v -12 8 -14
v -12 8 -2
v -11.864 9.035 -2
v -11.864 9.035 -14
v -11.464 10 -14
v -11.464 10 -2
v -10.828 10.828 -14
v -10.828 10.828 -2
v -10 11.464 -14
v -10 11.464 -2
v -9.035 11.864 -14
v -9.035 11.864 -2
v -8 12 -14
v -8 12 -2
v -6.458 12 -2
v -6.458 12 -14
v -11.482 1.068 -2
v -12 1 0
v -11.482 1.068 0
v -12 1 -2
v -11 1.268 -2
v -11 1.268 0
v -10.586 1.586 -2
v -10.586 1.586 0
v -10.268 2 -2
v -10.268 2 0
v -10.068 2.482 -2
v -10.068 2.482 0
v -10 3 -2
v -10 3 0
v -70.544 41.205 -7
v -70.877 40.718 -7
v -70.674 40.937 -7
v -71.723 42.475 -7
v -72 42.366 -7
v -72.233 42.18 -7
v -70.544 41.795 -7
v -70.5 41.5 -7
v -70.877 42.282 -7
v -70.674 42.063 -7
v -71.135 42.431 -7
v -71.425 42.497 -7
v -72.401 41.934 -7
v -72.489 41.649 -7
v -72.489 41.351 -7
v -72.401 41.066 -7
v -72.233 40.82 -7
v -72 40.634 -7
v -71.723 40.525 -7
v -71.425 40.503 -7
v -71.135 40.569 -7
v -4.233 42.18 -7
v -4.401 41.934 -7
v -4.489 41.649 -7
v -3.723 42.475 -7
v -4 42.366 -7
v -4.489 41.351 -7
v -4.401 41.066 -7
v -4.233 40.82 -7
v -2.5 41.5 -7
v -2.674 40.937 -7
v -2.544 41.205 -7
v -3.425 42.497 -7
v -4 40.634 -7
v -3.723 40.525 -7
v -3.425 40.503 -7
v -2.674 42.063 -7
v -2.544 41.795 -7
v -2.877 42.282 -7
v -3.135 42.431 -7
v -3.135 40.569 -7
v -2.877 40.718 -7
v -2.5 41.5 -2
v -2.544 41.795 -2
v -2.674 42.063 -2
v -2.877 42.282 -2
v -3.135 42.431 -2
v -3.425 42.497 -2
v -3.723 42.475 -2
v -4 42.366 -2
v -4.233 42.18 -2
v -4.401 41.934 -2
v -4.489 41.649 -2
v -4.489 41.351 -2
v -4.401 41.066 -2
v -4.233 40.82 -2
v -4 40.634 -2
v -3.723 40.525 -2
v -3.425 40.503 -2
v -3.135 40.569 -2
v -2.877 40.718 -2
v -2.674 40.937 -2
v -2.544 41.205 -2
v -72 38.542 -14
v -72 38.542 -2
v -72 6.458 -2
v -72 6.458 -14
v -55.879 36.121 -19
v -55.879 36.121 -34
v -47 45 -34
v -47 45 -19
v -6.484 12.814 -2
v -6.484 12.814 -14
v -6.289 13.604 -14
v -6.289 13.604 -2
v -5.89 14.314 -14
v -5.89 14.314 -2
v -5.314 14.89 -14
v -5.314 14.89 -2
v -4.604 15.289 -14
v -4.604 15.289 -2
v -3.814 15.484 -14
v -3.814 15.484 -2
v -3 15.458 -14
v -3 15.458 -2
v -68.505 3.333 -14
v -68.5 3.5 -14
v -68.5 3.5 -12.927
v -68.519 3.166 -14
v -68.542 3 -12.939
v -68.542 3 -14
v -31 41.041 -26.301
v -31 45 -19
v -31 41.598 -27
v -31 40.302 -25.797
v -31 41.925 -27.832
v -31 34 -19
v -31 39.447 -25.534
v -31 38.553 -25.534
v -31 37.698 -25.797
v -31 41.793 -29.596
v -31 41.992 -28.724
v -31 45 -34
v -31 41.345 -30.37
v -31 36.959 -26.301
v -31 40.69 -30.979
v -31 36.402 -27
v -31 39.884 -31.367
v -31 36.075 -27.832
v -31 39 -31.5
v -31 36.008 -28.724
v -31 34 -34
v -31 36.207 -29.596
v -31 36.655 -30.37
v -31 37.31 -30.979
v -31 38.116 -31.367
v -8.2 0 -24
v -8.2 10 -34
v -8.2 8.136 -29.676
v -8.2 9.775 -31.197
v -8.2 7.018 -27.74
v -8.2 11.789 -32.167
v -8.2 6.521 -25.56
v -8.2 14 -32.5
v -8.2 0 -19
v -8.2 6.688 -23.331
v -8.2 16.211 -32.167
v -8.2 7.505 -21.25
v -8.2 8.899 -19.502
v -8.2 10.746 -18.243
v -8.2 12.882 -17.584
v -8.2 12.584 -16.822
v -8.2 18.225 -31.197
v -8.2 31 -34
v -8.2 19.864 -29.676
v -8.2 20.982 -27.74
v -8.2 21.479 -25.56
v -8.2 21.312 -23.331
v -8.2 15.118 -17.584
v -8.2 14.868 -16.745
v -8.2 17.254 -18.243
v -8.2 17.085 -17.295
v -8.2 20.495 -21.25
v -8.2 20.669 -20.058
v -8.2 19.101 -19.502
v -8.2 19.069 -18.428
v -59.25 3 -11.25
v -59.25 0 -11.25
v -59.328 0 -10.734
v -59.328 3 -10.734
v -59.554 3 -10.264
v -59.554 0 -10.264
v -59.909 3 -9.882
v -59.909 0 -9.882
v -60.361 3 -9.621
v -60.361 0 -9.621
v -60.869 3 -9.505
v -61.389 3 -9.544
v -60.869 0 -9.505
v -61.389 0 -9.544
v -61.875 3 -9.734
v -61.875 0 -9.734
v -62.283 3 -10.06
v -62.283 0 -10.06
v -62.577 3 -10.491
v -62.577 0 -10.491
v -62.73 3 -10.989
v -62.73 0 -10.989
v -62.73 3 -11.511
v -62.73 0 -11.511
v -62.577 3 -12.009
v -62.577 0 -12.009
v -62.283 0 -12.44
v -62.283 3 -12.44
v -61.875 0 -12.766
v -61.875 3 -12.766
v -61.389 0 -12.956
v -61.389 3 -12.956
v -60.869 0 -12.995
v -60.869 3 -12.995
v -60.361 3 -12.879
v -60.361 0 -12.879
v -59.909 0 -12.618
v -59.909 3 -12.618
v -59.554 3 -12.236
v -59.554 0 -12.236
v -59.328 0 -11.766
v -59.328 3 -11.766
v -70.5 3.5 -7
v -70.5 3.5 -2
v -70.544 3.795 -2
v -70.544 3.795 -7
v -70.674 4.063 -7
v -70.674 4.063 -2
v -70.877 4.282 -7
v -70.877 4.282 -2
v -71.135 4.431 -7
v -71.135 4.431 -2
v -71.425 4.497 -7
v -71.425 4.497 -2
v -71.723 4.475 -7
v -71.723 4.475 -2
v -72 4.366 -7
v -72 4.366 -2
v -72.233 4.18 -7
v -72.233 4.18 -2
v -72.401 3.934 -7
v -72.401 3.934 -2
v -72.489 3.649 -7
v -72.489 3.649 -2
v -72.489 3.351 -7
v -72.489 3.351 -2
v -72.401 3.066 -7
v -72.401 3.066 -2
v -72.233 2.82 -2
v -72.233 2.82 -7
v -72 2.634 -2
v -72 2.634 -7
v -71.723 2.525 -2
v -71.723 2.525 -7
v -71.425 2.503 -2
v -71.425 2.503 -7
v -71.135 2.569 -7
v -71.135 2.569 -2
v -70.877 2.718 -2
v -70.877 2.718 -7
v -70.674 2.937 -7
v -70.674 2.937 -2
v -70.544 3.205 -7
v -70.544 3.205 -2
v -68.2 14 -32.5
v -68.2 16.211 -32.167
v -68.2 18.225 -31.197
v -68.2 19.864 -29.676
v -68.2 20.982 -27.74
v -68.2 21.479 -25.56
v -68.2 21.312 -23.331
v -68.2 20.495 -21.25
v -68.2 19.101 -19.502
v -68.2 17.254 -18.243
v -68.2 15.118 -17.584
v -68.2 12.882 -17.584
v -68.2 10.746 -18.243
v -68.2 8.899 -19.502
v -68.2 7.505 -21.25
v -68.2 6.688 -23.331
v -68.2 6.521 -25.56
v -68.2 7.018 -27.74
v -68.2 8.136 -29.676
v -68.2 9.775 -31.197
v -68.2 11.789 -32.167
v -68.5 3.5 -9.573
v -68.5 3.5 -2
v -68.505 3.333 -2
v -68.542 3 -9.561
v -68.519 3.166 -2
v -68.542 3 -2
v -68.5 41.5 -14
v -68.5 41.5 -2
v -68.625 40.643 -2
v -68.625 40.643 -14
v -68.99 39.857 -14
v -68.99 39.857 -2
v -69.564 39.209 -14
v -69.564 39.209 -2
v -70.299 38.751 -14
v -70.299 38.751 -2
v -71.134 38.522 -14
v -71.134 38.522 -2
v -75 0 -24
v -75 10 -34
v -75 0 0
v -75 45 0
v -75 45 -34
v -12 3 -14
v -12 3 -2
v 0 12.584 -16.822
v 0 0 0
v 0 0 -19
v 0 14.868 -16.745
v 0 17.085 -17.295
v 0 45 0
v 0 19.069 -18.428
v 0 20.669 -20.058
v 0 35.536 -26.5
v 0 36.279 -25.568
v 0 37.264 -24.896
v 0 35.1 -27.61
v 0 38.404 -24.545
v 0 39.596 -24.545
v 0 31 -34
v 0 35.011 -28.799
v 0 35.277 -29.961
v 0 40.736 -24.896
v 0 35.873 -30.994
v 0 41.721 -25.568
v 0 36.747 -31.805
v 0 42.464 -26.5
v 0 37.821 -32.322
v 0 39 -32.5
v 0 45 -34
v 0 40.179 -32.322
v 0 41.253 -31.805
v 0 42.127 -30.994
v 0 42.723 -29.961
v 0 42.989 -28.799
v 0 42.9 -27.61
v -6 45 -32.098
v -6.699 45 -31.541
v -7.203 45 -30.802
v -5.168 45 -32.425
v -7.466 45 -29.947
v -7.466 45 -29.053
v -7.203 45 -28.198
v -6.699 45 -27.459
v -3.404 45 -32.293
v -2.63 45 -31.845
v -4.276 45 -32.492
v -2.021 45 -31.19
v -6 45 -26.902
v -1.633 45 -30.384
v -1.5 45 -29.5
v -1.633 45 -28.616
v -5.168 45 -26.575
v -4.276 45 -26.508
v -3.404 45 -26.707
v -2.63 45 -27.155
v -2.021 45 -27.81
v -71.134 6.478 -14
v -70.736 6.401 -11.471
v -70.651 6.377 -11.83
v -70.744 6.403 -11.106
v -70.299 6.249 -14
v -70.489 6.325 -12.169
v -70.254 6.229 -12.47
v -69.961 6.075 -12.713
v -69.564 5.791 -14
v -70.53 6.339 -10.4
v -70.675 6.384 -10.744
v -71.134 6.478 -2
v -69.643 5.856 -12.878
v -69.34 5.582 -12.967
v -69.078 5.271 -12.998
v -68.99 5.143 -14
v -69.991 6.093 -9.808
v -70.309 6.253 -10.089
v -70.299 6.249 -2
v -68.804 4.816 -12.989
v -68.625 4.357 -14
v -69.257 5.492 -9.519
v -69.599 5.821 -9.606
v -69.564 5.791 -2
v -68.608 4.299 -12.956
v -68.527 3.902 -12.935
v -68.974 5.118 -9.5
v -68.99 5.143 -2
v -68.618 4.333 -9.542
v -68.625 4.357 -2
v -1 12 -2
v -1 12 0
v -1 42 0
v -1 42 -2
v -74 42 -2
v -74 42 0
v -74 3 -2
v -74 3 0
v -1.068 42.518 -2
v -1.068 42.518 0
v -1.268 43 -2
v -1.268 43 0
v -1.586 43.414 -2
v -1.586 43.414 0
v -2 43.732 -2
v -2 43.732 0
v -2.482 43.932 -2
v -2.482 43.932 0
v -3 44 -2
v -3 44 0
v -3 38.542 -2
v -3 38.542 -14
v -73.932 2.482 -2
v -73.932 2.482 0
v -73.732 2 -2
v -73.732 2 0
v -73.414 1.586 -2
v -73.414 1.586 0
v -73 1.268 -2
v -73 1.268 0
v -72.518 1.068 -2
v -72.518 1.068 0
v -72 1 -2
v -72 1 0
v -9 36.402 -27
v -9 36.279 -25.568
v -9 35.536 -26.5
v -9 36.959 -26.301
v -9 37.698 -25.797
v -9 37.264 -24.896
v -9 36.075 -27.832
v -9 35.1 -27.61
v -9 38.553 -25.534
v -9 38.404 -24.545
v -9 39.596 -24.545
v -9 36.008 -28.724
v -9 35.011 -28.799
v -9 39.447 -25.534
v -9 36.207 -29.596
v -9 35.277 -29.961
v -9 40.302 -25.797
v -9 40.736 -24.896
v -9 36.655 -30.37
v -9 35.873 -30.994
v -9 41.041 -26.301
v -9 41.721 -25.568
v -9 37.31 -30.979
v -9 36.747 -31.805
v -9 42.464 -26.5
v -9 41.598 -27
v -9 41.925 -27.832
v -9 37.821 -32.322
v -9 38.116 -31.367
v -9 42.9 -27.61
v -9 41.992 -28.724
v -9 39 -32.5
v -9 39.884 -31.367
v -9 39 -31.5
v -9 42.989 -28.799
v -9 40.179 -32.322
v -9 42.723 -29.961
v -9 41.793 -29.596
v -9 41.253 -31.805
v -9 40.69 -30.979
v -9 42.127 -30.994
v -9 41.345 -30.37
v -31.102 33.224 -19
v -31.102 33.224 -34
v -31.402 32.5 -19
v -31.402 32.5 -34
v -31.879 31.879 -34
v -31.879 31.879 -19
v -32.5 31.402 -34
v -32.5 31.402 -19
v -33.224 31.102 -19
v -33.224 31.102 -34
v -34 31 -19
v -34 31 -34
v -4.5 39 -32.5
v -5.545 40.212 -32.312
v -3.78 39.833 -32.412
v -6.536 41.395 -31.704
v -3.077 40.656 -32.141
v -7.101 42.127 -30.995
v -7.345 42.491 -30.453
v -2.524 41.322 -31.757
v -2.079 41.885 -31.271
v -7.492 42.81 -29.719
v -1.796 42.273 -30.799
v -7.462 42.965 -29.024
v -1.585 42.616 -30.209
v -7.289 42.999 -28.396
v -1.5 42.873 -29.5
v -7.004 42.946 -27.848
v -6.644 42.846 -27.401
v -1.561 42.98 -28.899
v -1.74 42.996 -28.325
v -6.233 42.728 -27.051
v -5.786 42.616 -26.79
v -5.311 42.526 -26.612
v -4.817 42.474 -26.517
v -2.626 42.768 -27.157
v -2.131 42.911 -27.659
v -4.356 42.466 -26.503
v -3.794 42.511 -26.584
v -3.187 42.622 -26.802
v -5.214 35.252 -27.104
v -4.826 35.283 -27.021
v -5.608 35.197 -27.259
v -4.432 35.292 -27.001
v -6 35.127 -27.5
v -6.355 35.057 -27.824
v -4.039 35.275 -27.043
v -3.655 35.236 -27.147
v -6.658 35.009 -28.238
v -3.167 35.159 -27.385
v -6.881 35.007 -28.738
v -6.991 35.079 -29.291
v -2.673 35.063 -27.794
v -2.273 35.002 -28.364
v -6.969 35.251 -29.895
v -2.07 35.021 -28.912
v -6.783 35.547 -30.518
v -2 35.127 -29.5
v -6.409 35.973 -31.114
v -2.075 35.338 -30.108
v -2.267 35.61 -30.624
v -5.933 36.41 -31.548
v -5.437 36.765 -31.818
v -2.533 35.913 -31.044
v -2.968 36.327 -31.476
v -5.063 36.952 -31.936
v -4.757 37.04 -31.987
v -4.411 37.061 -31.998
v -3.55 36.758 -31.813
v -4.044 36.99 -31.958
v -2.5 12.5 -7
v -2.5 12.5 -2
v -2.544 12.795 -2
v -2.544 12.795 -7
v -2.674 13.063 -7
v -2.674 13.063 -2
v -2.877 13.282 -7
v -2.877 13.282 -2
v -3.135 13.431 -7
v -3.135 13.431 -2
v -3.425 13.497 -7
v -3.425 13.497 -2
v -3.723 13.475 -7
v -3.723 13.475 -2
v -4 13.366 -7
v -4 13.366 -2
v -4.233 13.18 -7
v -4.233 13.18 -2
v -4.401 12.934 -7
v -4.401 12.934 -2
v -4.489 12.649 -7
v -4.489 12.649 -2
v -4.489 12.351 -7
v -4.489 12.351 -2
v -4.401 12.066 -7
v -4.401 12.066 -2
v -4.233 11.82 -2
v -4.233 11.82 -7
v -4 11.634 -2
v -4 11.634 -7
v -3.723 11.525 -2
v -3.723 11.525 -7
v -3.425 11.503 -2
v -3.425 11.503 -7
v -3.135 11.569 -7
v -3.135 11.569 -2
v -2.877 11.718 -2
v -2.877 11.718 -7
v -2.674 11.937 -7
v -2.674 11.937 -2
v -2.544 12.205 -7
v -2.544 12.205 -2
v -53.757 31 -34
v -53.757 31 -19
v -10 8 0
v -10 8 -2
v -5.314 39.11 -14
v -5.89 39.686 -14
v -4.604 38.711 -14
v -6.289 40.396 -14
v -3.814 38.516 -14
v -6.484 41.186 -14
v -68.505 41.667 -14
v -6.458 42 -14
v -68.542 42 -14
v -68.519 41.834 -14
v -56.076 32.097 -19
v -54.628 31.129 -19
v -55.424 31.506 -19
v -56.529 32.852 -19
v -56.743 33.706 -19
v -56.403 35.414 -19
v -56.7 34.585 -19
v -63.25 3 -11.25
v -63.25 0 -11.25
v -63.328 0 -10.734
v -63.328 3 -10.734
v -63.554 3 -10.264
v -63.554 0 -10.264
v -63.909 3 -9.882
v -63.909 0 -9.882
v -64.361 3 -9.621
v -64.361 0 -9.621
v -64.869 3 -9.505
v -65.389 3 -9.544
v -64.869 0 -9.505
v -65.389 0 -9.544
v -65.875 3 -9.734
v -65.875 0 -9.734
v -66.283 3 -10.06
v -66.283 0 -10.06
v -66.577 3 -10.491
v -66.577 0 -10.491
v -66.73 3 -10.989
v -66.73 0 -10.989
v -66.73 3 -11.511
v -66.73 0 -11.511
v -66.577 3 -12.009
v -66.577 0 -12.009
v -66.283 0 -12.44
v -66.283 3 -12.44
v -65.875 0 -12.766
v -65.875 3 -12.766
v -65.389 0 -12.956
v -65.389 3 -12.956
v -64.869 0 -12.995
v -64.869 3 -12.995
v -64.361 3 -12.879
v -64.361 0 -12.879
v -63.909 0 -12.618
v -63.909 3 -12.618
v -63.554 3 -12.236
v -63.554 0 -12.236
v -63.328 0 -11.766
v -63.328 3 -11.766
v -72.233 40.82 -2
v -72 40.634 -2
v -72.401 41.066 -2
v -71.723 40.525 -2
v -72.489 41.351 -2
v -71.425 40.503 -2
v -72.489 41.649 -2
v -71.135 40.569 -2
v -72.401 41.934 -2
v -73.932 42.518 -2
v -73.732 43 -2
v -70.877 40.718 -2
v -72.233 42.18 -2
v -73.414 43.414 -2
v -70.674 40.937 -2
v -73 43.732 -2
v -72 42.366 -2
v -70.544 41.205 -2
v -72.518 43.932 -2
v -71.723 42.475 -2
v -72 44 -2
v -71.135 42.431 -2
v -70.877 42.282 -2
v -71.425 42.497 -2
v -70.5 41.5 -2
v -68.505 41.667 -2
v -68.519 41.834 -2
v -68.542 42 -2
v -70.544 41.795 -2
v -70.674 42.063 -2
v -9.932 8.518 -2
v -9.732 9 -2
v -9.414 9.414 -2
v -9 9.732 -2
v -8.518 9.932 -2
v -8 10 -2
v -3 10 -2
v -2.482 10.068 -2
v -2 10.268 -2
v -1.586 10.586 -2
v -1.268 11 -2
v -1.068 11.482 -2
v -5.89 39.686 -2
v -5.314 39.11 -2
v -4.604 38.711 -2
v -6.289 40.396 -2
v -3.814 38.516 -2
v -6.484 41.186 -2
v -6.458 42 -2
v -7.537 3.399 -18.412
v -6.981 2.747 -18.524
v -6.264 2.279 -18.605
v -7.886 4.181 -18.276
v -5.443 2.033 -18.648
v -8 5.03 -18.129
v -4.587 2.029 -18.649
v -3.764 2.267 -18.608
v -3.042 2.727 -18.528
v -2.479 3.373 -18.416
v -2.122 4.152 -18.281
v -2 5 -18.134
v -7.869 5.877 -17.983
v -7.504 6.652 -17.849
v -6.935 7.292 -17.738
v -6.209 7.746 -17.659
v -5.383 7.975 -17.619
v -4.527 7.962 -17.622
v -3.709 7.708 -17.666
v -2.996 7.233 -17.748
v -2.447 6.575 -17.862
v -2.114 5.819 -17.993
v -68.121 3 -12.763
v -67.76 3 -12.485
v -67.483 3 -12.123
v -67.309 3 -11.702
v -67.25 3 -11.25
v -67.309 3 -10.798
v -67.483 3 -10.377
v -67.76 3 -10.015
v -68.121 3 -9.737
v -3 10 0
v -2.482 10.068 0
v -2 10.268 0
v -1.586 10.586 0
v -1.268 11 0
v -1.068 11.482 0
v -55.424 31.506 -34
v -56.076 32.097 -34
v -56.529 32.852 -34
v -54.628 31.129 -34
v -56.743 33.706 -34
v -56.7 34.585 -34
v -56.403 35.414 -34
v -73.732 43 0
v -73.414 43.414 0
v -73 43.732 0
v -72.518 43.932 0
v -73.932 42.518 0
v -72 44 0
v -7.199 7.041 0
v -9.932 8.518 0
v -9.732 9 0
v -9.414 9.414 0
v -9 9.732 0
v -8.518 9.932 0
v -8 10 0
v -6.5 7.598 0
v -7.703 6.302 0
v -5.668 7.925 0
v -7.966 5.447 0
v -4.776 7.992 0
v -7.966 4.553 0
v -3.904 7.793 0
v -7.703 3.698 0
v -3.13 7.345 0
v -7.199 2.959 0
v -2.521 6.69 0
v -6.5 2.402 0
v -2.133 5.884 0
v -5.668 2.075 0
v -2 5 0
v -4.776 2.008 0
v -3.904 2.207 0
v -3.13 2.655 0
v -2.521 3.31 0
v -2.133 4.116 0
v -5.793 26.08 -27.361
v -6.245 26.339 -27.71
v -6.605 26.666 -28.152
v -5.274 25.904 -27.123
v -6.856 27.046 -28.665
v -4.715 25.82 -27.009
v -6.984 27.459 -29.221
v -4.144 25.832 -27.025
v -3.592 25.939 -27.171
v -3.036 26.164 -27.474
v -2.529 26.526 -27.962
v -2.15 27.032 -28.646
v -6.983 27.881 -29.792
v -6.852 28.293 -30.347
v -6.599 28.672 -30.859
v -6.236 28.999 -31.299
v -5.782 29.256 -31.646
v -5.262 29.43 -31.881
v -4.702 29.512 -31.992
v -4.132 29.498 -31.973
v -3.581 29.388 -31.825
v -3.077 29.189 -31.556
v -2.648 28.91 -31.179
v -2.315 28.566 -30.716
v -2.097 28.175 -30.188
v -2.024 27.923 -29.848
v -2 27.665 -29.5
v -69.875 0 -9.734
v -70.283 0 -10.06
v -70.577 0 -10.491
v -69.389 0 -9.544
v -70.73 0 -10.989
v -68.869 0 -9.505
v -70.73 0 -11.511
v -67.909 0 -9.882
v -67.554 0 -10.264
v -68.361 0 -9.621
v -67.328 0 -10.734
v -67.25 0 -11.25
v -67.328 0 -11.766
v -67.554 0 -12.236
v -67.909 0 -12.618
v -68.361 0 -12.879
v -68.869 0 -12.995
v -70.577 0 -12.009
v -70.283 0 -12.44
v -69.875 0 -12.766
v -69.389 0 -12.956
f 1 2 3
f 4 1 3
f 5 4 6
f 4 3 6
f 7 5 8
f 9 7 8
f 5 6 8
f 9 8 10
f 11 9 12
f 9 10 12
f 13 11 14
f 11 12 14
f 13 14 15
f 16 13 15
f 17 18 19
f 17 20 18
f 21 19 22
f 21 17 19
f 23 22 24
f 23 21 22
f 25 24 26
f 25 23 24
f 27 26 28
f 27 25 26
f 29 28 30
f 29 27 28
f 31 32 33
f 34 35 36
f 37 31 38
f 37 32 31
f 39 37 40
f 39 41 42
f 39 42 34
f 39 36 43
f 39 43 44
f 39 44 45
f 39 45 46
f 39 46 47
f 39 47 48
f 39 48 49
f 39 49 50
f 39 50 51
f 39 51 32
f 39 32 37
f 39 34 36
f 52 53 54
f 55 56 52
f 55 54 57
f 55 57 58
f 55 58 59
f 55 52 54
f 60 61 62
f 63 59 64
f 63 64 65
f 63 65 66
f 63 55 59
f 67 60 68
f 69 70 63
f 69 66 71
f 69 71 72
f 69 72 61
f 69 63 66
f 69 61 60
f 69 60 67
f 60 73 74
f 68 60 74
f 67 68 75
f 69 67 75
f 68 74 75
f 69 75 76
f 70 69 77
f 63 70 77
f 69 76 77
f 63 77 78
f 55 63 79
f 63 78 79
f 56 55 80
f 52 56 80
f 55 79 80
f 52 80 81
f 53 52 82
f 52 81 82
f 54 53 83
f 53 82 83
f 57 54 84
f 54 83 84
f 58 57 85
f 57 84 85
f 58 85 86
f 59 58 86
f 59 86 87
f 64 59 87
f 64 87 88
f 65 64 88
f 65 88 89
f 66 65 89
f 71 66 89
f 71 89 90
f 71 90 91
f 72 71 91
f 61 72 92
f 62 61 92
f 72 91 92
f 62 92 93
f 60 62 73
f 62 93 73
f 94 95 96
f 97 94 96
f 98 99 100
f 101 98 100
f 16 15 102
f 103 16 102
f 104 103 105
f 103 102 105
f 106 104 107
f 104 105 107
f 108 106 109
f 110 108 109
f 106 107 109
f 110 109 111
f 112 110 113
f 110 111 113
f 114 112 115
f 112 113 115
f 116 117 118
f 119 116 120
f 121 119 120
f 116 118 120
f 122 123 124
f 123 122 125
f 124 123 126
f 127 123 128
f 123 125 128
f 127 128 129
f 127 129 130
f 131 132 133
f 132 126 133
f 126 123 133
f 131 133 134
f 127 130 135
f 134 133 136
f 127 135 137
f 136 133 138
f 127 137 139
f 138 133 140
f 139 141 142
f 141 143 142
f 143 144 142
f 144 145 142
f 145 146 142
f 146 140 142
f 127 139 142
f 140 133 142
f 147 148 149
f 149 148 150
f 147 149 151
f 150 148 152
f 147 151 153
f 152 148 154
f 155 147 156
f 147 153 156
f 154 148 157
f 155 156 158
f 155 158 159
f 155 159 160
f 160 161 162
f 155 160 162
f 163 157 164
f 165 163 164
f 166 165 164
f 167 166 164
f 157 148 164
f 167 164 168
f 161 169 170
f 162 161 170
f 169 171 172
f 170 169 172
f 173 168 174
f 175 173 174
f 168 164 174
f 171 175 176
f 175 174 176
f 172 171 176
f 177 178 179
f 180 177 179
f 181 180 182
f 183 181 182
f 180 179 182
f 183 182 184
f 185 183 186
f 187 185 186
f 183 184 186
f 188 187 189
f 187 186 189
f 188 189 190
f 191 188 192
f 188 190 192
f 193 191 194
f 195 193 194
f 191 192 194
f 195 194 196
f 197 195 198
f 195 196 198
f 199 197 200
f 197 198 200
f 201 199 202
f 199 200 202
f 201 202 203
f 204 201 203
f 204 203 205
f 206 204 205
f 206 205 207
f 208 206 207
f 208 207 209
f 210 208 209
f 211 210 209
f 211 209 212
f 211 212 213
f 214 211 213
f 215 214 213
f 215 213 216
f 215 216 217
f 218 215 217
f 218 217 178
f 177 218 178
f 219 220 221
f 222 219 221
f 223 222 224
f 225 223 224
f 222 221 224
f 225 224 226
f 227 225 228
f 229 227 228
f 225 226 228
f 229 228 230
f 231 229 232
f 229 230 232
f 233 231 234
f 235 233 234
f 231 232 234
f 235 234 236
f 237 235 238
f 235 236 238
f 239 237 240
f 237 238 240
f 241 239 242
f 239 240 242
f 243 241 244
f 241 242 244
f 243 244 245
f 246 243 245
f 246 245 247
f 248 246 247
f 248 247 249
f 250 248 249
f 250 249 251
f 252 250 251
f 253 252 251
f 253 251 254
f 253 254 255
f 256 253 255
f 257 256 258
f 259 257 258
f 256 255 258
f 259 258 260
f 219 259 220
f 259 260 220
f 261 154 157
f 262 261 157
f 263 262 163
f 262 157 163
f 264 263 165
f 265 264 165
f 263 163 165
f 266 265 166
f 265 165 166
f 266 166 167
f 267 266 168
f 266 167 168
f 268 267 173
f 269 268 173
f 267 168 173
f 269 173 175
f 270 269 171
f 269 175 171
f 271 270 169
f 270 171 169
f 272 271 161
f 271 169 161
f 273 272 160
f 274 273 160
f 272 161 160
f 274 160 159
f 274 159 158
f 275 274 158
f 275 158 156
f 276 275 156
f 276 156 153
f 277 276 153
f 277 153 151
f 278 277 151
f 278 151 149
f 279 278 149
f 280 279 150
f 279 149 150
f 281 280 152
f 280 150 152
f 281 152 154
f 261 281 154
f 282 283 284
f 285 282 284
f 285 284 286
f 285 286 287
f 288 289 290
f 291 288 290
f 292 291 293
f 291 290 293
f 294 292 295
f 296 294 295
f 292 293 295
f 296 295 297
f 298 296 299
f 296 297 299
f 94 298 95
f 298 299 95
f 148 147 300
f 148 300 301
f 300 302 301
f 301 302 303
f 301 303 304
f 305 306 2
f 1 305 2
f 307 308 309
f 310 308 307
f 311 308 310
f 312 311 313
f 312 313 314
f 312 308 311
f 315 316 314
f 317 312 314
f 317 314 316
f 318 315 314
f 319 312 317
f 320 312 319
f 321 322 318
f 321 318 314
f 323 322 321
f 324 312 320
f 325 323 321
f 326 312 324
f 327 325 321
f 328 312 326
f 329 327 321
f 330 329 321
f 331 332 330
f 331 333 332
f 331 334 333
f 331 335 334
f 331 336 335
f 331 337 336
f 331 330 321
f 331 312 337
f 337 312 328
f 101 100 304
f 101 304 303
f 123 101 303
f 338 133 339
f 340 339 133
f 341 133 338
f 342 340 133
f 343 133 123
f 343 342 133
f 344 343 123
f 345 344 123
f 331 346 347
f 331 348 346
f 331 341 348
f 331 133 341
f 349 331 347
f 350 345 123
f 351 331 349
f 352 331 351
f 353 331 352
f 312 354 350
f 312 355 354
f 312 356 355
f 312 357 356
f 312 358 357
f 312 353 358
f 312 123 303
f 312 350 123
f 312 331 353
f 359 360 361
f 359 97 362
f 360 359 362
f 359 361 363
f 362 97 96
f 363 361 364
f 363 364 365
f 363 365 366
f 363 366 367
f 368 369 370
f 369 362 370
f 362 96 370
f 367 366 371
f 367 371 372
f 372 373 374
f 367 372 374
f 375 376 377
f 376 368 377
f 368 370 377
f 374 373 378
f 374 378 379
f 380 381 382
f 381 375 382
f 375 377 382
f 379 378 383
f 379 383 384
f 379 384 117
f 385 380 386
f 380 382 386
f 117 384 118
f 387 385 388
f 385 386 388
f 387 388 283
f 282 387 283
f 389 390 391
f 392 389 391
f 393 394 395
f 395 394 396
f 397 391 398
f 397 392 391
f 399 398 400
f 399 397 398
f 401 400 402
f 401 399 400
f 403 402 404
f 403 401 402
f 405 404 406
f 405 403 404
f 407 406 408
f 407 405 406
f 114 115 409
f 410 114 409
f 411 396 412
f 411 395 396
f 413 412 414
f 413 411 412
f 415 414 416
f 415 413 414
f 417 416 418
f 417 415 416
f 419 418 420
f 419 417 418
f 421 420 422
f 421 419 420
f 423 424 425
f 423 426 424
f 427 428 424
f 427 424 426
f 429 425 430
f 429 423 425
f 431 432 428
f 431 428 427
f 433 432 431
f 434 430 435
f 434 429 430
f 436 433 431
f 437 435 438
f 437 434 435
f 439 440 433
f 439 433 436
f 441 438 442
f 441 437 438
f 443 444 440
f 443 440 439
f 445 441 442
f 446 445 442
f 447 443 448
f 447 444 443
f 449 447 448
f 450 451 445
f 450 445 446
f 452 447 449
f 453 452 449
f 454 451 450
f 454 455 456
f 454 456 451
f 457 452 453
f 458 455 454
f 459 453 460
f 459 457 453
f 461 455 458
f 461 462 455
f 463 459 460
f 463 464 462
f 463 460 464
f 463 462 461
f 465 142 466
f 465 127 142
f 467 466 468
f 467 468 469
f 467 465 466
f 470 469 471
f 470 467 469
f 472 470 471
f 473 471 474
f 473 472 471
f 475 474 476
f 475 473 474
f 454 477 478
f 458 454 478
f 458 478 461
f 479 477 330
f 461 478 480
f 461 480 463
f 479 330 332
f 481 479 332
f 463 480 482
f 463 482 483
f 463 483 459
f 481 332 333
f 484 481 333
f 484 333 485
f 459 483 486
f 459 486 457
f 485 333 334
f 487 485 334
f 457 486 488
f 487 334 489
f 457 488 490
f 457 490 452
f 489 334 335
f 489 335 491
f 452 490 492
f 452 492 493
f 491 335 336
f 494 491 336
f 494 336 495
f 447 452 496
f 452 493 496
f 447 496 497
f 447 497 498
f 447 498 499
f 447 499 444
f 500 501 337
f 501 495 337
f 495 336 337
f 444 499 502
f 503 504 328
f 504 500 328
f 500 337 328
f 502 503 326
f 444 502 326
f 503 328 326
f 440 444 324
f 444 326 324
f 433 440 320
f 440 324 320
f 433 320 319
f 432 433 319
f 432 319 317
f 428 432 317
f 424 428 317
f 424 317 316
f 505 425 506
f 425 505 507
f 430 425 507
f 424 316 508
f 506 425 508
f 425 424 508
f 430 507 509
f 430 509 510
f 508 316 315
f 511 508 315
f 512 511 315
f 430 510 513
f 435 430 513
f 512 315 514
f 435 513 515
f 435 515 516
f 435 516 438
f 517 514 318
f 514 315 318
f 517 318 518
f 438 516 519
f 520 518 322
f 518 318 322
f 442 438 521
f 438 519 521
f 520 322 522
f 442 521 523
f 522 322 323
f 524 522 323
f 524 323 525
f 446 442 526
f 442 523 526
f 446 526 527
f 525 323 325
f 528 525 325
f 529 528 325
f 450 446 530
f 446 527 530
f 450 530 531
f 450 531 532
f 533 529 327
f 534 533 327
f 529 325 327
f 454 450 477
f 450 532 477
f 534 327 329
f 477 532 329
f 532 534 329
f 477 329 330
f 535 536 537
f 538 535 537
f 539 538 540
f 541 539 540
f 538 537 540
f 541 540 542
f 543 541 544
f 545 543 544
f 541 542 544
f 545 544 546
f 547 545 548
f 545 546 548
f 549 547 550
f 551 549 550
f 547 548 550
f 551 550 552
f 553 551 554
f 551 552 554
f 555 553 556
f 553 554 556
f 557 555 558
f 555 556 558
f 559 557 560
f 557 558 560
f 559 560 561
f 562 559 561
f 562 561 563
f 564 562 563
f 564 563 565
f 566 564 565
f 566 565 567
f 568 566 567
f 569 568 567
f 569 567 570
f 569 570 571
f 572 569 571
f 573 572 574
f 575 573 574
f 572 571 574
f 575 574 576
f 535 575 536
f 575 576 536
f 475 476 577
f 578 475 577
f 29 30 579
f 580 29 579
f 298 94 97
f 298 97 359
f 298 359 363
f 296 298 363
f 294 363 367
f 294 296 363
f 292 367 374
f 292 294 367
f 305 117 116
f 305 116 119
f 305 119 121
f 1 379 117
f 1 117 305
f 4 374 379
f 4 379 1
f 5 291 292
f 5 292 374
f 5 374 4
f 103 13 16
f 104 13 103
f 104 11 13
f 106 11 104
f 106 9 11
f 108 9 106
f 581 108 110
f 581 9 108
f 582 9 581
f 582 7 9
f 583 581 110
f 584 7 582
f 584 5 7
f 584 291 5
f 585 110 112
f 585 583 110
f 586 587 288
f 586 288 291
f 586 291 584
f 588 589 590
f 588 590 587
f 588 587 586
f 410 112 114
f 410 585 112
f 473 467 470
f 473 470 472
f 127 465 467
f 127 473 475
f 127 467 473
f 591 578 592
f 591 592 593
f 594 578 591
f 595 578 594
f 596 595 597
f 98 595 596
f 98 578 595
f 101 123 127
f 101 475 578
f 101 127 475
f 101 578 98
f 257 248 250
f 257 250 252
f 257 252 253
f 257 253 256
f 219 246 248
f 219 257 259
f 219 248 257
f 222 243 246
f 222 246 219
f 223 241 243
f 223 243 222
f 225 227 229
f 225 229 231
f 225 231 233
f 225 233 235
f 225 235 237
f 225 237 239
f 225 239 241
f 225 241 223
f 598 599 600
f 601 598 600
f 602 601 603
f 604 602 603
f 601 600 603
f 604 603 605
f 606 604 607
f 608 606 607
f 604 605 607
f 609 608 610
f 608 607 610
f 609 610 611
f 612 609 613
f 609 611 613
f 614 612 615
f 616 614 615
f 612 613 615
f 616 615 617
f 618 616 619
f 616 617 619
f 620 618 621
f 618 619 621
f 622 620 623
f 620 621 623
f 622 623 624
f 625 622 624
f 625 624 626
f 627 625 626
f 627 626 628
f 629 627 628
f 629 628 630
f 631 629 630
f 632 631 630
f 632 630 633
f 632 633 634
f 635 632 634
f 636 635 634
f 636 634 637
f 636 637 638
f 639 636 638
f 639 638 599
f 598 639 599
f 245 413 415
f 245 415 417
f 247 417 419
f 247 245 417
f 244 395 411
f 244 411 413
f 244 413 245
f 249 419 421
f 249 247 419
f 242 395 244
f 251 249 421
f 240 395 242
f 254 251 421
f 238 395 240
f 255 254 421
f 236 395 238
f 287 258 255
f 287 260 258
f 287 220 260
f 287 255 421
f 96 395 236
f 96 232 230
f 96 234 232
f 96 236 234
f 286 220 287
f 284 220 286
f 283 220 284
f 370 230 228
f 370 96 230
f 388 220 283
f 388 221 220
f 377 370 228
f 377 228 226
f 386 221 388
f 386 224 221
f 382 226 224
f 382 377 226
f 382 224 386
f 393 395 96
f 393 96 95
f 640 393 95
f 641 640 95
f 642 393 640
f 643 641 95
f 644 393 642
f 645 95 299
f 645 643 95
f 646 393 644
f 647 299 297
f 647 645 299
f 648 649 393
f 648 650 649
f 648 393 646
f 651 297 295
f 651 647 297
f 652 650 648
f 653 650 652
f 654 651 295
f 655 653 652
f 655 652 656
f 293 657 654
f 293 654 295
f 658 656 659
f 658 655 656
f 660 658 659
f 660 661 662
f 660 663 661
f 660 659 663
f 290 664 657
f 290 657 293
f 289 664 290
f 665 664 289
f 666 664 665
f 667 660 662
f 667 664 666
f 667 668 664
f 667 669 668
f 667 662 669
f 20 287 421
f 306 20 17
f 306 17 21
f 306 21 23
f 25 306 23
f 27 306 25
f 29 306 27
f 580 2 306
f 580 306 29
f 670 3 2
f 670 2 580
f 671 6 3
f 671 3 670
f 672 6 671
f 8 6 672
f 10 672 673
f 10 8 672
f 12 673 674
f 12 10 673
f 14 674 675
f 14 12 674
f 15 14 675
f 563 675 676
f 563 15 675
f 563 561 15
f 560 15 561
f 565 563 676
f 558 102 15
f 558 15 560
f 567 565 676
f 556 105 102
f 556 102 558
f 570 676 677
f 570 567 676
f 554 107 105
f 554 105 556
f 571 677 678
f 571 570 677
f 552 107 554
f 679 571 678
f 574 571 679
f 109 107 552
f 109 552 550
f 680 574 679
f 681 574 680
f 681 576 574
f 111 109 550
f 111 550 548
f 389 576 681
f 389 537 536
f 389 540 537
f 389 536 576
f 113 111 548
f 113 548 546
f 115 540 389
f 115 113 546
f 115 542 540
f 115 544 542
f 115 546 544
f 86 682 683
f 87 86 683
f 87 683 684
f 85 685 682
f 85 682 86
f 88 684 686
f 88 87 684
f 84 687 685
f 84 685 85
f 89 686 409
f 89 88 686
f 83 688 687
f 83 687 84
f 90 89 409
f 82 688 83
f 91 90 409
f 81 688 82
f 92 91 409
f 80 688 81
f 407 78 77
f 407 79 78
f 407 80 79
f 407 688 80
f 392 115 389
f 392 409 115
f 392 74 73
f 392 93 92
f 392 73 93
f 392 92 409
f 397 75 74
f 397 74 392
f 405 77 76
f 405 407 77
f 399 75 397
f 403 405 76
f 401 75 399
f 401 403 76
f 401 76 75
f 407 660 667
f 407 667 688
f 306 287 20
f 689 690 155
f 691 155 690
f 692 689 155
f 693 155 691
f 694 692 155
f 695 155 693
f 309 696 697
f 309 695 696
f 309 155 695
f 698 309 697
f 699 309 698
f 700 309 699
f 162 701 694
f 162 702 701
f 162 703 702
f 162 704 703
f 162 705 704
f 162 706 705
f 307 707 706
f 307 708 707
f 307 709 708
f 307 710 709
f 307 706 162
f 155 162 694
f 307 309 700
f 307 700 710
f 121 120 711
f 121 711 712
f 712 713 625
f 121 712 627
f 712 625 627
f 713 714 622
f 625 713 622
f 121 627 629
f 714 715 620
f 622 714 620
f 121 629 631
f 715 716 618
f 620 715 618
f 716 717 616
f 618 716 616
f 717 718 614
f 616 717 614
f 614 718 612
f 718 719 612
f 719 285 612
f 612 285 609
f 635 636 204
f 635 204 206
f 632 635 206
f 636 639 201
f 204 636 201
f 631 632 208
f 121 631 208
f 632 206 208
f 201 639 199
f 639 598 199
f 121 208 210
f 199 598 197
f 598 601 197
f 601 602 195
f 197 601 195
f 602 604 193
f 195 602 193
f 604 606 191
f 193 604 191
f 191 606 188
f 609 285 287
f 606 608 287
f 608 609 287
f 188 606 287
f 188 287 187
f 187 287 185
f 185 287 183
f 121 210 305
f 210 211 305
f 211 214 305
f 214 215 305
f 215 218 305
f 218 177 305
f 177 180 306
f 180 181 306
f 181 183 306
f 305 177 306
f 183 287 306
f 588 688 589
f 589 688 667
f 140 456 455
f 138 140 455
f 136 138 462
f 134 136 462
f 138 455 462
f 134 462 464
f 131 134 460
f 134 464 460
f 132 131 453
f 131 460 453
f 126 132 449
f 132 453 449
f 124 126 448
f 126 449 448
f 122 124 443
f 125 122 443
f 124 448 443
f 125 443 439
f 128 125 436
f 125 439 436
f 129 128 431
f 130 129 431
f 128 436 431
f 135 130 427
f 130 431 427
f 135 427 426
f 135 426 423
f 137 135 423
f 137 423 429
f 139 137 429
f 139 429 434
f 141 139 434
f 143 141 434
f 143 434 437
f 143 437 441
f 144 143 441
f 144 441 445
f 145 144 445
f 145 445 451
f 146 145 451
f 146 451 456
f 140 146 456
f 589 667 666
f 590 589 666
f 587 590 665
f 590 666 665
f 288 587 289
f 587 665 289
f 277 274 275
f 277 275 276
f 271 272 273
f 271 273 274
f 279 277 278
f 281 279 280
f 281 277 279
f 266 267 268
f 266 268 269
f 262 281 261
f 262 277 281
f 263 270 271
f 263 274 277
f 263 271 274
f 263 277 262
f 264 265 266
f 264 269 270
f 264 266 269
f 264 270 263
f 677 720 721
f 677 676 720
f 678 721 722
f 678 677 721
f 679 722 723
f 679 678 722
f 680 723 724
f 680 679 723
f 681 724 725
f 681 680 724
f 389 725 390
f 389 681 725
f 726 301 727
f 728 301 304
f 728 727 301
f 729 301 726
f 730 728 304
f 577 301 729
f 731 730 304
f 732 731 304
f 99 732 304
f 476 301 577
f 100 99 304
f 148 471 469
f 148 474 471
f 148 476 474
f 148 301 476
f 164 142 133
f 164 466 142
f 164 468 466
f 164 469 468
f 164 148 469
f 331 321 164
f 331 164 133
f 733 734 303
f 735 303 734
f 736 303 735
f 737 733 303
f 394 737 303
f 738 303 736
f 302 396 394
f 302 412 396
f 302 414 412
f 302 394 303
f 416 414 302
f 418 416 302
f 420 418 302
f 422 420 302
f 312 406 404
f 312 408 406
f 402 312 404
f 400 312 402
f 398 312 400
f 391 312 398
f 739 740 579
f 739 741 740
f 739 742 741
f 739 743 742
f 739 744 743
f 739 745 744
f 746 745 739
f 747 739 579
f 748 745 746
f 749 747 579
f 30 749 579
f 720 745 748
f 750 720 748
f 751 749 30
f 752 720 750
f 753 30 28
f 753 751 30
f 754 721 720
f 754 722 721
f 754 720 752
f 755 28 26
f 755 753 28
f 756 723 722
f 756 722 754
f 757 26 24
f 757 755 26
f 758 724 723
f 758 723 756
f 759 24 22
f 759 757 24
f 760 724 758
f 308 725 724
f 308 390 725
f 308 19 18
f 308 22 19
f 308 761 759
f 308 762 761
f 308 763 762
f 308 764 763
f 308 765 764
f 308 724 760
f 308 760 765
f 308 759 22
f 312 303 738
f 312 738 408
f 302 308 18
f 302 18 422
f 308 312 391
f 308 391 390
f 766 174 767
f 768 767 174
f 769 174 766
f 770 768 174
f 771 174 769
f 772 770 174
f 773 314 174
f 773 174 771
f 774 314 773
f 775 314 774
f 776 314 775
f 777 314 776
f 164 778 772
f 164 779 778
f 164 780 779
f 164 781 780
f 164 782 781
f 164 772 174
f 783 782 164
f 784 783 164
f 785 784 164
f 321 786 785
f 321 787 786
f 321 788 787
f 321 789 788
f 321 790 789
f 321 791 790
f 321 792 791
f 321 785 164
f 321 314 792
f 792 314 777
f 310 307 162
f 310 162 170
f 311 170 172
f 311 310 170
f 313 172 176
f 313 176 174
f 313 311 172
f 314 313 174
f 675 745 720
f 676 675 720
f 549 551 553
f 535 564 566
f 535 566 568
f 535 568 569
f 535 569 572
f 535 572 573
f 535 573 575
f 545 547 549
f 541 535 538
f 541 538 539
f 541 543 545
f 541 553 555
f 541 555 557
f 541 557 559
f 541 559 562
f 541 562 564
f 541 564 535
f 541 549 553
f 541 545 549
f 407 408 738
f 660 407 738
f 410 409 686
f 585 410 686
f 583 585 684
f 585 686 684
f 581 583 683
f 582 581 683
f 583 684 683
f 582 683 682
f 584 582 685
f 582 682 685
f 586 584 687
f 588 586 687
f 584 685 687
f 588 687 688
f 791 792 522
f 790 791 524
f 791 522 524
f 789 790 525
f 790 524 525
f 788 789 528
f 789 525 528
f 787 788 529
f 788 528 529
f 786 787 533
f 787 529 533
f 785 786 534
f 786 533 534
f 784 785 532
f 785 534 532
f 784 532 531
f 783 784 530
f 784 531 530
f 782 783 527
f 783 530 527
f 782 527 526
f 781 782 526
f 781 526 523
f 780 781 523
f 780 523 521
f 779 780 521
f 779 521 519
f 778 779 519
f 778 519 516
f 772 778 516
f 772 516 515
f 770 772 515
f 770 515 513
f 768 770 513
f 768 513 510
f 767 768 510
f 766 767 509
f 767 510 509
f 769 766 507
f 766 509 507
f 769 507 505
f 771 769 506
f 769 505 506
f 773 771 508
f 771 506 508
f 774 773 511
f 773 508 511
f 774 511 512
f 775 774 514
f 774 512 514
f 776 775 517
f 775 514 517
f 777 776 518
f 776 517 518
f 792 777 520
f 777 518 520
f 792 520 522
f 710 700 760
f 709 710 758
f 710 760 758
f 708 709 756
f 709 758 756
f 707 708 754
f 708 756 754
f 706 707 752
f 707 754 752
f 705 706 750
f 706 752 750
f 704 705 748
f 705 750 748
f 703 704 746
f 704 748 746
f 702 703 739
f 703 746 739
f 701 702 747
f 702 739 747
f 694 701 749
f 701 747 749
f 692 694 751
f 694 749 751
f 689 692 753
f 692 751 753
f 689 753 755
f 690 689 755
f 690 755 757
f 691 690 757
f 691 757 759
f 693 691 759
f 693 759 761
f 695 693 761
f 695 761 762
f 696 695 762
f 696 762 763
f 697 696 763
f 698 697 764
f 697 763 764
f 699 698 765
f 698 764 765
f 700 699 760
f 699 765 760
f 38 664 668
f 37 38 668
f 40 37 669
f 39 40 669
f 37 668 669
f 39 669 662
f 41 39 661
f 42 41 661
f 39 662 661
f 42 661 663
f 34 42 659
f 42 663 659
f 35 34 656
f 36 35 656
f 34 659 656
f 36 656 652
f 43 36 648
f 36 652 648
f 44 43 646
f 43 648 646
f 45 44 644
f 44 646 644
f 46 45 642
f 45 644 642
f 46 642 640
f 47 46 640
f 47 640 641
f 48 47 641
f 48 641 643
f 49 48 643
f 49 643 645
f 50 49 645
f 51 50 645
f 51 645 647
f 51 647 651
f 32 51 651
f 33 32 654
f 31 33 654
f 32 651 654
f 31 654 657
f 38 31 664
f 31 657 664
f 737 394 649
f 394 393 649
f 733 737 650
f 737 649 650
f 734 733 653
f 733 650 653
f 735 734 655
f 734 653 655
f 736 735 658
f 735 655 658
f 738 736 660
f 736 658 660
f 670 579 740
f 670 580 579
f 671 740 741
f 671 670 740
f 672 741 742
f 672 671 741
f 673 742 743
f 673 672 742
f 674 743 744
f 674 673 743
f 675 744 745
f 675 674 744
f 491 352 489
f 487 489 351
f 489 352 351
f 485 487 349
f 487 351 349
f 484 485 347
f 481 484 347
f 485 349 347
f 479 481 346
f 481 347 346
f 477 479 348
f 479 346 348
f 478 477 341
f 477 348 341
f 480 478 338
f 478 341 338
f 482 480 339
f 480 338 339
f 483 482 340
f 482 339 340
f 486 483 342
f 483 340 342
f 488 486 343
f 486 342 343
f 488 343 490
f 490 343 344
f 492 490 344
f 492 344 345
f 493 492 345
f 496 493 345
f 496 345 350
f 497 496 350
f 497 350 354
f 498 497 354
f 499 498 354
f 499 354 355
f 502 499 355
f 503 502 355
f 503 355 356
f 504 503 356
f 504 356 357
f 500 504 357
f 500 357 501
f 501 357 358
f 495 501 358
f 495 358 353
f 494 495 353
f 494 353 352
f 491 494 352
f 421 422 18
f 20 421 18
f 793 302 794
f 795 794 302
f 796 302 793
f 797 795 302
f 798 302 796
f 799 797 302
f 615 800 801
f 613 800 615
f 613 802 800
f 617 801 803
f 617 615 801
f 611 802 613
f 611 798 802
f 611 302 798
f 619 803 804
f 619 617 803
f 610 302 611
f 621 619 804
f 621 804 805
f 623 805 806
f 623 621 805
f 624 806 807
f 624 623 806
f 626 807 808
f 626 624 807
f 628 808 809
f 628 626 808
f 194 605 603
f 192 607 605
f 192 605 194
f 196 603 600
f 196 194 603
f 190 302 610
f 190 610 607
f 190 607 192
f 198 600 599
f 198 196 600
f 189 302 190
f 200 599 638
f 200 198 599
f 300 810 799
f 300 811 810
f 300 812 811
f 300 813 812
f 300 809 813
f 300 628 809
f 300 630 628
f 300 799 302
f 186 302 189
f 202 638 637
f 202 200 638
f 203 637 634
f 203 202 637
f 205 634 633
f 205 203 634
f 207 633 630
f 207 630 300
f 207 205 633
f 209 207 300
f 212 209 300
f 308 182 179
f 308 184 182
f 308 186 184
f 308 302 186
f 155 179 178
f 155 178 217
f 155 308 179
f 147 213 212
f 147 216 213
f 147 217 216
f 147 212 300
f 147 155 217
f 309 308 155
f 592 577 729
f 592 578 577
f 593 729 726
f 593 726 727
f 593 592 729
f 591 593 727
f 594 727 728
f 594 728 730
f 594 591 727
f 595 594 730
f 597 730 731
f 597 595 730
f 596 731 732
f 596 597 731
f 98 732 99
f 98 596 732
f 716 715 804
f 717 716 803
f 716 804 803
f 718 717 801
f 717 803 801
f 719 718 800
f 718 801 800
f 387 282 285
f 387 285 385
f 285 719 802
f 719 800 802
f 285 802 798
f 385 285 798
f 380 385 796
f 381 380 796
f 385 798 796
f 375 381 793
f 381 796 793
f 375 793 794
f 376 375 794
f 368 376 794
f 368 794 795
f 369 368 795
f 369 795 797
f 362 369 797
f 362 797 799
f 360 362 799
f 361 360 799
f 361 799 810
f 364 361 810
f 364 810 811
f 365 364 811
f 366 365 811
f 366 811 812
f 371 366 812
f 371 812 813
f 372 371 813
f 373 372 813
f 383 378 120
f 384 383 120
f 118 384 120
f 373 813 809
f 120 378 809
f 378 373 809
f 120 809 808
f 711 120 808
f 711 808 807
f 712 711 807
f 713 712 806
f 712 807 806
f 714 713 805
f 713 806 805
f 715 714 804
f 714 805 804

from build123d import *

# Parameters (mm, degrees)
BOSS_EXTRUDE1_DEPTH = 75
CUT_EXTRUDE1_DEPTH  = 8.2
CUT_EXTRUDE2_DEPTH  = 15
FILLET1_R           = 3
SKETCH5_R           = 4
CUT_EXTRUDE3_DEPTH  = 9
CUT_EXTRUDE4_REACH  = 47
SKETCH6_R           = 3
CUT_EXTRUDE5_REACH  = 36
SKETCH7_R           = 3
CUT_EXTRUDE7_REACH  = 47
SKETCH10_R          = 2.5
CUT_EXTRUDE8_REACH  = 68
SKETCH11_R          = 3
CUT_EXTRUDE10_DEPTH = 2
FILLET3_R           = 2
CUT_EXTRUDE11_DEPTH = 12
CUT_EXTRUDE12_REACH = 47
SKETCH16_R          = 1.75
SKETCH17_R          = 1
CUT_EXTRUDE13_DEPTH = 5
SKETCH8_R           = 7.5
CUT_EXTRUDE14_DEPTH = 60


with BuildPart() as part:
    # Sketch1 → Boss-Extrude1 (new body)
    with BuildSketch(Plane(origin=(0, 0, 0), x_dir=(0, 0, -1), z_dir=(1, 0, 0))):
        Polygon((24, 0), (34, 10), (34, 45), (0, 45), (0, 0), align=None)
    extrude(amount=-BOSS_EXTRUDE1_DEPTH)

    # Sketch2 → Cut-Extrude1 (cut)
    with BuildSketch(Plane(origin=(0, 0, 0), x_dir=(0, 0, -1), z_dir=(1, 0, 0))):
        with BuildLine():
            Line((19, 0), (16.821625926, 12.584303175))
            ThreePointArc((16.821625926, 12.584303175), (17.294620228, 17.084983398), (20.058295206, 20.668549597))
            Line((20.058295206, 20.668549597), (34, 31))
            Line((34, 31), (34, 0))
            Line((34, 0), (19, 0))
        make_face()
    extrude(amount=-CUT_EXTRUDE1_DEPTH, mode=Mode.SUBTRACT)

    # Sketch3 → Cut-Extrude2 (cut)
    with BuildSketch(Plane(origin=(0, 0, -34), x_dir=(-1, 0, 0), z_dir=(0, 0, -1))):
        Polygon((31, 45), (31, 31), (61, 31), (47, 45), align=None)
    extrude(amount=-CUT_EXTRUDE2_DEPTH, mode=Mode.SUBTRACT)

    # Fillet1
    fillet1_edges = [part.edges().sort_by_distance(p)[0] for p in [
        (-61, 31, -26.5),
        (-31, 31, -26.5),
    ]]
    fillet(fillet1_edges, radius=FILLET1_R)

    # Sketch5 → Cut-Extrude3 (cut)
    with BuildSketch(Plane(origin=(0, 0, 0), x_dir=(0, 0, -1), z_dir=(1, 0, 0))):
        with Locations((28.5, 39)):
            Circle(SKETCH5_R)
    extrude(amount=-CUT_EXTRUDE3_DEPTH, mode=Mode.SUBTRACT)

    # Sketch6 → Cut-Extrude4 (cut, up to next)
    with BuildSketch(Plane(origin=(0, 45, 0), x_dir=(1, 0, 0), z_dir=(0, 1, 0)), mode=Mode.PRIVATE) as cut_extrude4_sk1:
        with Locations((-4.5, 29.5)):
            Circle(SKETCH6_R)
    cut_extrude4_tool1 = extrude(cut_extrude4_sk1.sketch, amount=-CUT_EXTRUDE4_REACH, mode=Mode.PRIVATE) & part.part
    add(cut_extrude4_tool1.solids().sort_by_distance((-4.5, 45, -29.5))[0], mode=Mode.SUBTRACT)

    # Sketch7 → Cut-Extrude5 (cut, up to next)
    with BuildSketch(Plane.XY, mode=Mode.PRIVATE) as cut_extrude5_sk1:
        with Locations((-5, 5)):
            Circle(SKETCH7_R)
    cut_extrude5_tool1 = extrude(cut_extrude5_sk1.sketch, amount=-CUT_EXTRUDE5_REACH, mode=Mode.PRIVATE) & part.part
    add(cut_extrude5_tool1.solids().sort_by_distance((-5, 5, 0))[0], mode=Mode.SUBTRACT)

    # Sketch10 → Cut-Extrude7 (cut, up to next)
    with BuildSketch(Plane(origin=(0, 45, 0), x_dir=(1, 0, 0), z_dir=(0, 1, 0)), mode=Mode.PRIVATE) as cut_extrude7_sk1:
        with Locations((-4.5, 29.5)):
            Circle(SKETCH10_R)
    cut_extrude7_tool1 = extrude(cut_extrude7_sk1.sketch, amount=-CUT_EXTRUDE7_REACH, mode=Mode.PRIVATE) & part.part
    add(cut_extrude7_tool1.solids().sort_by_distance((-4.5, 45, -29.5))[0], mode=Mode.SUBTRACT)

    # Sketch11 → Cut-Extrude8 (cut, up to next)
    with BuildSketch(Plane(origin=(-9, 0, 0), x_dir=(0, 0, -1), z_dir=(1, 0, 0)), mode=Mode.PRIVATE) as cut_extrude8_sk1:
        with Locations((28.5, 39)):
            Circle(SKETCH11_R)
    cut_extrude8_tool1 = extrude(cut_extrude8_sk1.sketch, amount=-CUT_EXTRUDE8_REACH, mode=Mode.PRIVATE) & part.part
    add(cut_extrude8_tool1.solids().sort_by_distance((-9, 39, -28.5))[0], mode=Mode.SUBTRACT)

    # Sketch13 → Cut-Extrude10 (cut)
    with BuildSketch(Plane.XY):
        Polygon((-74, 44), (-74, 1), (-10, 1), (-10, 10), (-1, 10), (-1, 44), align=None)
    extrude(amount=-CUT_EXTRUDE10_DEPTH, mode=Mode.SUBTRACT)

    # Fillet3
    fillet3_edges = [part.edges().sort_by_distance(p)[0] for p in [
        (-74, 44, -1),
        (-1, 44, -1),
        (-1, 10, -1),
        (-10, 10, -1),
        (-10, 1, -1),
        (-74, 1, -1),
    ]]
    fillet(fillet3_edges, radius=FILLET3_R)

    # Sketch14 → Cut-Extrude11 (cut)
    with BuildSketch(Plane.XY.offset(-2)):
        with BuildLine():
            ThreePointArc((-6.458039892, 12), (-5.621320344, 14.621320344), (-3, 15.458039892))
            Line((-3, 15.458039892), (-3, 38.541960108))
            ThreePointArc((-3, 38.541960108), (-5.621320344, 39.378679656), (-6.458039892, 42))
            Line((-6.458039892, 42), (-68.541960108, 42))
            ThreePointArc((-68.541960108, 42), (-68.510508432, 41.750878781), (-68.5, 41.5))
            ThreePointArc((-68.5, 41.5), (-69.563508327, 39.208712153), (-72, 38.541960108))
            Line((-72, 38.541960108), (-72, 6.458039892))
            ThreePointArc((-72, 6.458039892), (-69.563508327, 5.791287847), (-68.5, 3.5))
            ThreePointArc((-68.5, 3.5), (-68.510508432, 3.249121219), (-68.541960108, 3))
            Line((-68.541960108, 3), (-12, 3))
            Line((-12, 3), (-12, 8))
            ThreePointArc((-12, 8), (-10.828427125, 10.828427125), (-8, 12))
            Line((-8, 12), (-6.458039892, 12))
        make_face()
    extrude(amount=-CUT_EXTRUDE11_DEPTH, mode=Mode.SUBTRACT)

    # Sketch16 → Cut-Extrude12 (cut, up to next)
    with BuildSketch(Plane.XZ, mode=Mode.PRIVATE) as cut_extrude12_sk1:
        with Locations((-69, -11.25)):
            Circle(SKETCH16_R)
    cut_extrude12_tool1 = extrude(cut_extrude12_sk1.sketch, amount=-CUT_EXTRUDE12_REACH, mode=Mode.PRIVATE) & part.part
    add(cut_extrude12_tool1.solids().sort_by_distance((-69, 0, -11.25))[0], mode=Mode.SUBTRACT)
    # Sketch16 → Cut-Extrude12 (cut, up to next)
    with BuildSketch(Plane.XZ, mode=Mode.PRIVATE) as cut_extrude12_sk2:
        with Locations((-65, -11.25)):
            Circle(SKETCH16_R)
    cut_extrude12_tool2 = extrude(cut_extrude12_sk2.sketch, amount=-CUT_EXTRUDE12_REACH, mode=Mode.PRIVATE) & part.part
    add(cut_extrude12_tool2.solids().sort_by_distance((-65, 0, -11.25))[0], mode=Mode.SUBTRACT)
    # Sketch16 → Cut-Extrude12 (cut, up to next)
    with BuildSketch(Plane.XZ, mode=Mode.PRIVATE) as cut_extrude12_sk3:
        with Locations((-61, -11.25)):
            Circle(SKETCH16_R)
    cut_extrude12_tool3 = extrude(cut_extrude12_sk3.sketch, amount=-CUT_EXTRUDE12_REACH, mode=Mode.PRIVATE) & part.part
    add(cut_extrude12_tool3.solids().sort_by_distance((-61, 0, -11.25))[0], mode=Mode.SUBTRACT)

    # Sketch17 → Cut-Extrude13 (cut)
    with BuildSketch(Plane.XY.offset(-2)):
        with Locations((-71.5, 41.5)):
            Circle(SKETCH17_R)
        with Locations((-71.5, 3.5)):
            Circle(SKETCH17_R)
        with Locations((-3.5, 12.5)):
            Circle(SKETCH17_R)
        with Locations((-3.5, 41.5)):
            Circle(SKETCH17_R)
    extrude(amount=-CUT_EXTRUDE13_DEPTH, mode=Mode.SUBTRACT)

    # Sketch8 → Cut-Extrude14 (cut)
    with BuildSketch(Plane(origin=(-8.2, 0, 0), x_dir=(0, 0, -1), z_dir=(1, 0, 0))):
        with Locations((25, 14)):
            Circle(SKETCH8_R)
    extrude(amount=-CUT_EXTRUDE14_DEPTH, mode=Mode.SUBTRACT)


solid = part.part
